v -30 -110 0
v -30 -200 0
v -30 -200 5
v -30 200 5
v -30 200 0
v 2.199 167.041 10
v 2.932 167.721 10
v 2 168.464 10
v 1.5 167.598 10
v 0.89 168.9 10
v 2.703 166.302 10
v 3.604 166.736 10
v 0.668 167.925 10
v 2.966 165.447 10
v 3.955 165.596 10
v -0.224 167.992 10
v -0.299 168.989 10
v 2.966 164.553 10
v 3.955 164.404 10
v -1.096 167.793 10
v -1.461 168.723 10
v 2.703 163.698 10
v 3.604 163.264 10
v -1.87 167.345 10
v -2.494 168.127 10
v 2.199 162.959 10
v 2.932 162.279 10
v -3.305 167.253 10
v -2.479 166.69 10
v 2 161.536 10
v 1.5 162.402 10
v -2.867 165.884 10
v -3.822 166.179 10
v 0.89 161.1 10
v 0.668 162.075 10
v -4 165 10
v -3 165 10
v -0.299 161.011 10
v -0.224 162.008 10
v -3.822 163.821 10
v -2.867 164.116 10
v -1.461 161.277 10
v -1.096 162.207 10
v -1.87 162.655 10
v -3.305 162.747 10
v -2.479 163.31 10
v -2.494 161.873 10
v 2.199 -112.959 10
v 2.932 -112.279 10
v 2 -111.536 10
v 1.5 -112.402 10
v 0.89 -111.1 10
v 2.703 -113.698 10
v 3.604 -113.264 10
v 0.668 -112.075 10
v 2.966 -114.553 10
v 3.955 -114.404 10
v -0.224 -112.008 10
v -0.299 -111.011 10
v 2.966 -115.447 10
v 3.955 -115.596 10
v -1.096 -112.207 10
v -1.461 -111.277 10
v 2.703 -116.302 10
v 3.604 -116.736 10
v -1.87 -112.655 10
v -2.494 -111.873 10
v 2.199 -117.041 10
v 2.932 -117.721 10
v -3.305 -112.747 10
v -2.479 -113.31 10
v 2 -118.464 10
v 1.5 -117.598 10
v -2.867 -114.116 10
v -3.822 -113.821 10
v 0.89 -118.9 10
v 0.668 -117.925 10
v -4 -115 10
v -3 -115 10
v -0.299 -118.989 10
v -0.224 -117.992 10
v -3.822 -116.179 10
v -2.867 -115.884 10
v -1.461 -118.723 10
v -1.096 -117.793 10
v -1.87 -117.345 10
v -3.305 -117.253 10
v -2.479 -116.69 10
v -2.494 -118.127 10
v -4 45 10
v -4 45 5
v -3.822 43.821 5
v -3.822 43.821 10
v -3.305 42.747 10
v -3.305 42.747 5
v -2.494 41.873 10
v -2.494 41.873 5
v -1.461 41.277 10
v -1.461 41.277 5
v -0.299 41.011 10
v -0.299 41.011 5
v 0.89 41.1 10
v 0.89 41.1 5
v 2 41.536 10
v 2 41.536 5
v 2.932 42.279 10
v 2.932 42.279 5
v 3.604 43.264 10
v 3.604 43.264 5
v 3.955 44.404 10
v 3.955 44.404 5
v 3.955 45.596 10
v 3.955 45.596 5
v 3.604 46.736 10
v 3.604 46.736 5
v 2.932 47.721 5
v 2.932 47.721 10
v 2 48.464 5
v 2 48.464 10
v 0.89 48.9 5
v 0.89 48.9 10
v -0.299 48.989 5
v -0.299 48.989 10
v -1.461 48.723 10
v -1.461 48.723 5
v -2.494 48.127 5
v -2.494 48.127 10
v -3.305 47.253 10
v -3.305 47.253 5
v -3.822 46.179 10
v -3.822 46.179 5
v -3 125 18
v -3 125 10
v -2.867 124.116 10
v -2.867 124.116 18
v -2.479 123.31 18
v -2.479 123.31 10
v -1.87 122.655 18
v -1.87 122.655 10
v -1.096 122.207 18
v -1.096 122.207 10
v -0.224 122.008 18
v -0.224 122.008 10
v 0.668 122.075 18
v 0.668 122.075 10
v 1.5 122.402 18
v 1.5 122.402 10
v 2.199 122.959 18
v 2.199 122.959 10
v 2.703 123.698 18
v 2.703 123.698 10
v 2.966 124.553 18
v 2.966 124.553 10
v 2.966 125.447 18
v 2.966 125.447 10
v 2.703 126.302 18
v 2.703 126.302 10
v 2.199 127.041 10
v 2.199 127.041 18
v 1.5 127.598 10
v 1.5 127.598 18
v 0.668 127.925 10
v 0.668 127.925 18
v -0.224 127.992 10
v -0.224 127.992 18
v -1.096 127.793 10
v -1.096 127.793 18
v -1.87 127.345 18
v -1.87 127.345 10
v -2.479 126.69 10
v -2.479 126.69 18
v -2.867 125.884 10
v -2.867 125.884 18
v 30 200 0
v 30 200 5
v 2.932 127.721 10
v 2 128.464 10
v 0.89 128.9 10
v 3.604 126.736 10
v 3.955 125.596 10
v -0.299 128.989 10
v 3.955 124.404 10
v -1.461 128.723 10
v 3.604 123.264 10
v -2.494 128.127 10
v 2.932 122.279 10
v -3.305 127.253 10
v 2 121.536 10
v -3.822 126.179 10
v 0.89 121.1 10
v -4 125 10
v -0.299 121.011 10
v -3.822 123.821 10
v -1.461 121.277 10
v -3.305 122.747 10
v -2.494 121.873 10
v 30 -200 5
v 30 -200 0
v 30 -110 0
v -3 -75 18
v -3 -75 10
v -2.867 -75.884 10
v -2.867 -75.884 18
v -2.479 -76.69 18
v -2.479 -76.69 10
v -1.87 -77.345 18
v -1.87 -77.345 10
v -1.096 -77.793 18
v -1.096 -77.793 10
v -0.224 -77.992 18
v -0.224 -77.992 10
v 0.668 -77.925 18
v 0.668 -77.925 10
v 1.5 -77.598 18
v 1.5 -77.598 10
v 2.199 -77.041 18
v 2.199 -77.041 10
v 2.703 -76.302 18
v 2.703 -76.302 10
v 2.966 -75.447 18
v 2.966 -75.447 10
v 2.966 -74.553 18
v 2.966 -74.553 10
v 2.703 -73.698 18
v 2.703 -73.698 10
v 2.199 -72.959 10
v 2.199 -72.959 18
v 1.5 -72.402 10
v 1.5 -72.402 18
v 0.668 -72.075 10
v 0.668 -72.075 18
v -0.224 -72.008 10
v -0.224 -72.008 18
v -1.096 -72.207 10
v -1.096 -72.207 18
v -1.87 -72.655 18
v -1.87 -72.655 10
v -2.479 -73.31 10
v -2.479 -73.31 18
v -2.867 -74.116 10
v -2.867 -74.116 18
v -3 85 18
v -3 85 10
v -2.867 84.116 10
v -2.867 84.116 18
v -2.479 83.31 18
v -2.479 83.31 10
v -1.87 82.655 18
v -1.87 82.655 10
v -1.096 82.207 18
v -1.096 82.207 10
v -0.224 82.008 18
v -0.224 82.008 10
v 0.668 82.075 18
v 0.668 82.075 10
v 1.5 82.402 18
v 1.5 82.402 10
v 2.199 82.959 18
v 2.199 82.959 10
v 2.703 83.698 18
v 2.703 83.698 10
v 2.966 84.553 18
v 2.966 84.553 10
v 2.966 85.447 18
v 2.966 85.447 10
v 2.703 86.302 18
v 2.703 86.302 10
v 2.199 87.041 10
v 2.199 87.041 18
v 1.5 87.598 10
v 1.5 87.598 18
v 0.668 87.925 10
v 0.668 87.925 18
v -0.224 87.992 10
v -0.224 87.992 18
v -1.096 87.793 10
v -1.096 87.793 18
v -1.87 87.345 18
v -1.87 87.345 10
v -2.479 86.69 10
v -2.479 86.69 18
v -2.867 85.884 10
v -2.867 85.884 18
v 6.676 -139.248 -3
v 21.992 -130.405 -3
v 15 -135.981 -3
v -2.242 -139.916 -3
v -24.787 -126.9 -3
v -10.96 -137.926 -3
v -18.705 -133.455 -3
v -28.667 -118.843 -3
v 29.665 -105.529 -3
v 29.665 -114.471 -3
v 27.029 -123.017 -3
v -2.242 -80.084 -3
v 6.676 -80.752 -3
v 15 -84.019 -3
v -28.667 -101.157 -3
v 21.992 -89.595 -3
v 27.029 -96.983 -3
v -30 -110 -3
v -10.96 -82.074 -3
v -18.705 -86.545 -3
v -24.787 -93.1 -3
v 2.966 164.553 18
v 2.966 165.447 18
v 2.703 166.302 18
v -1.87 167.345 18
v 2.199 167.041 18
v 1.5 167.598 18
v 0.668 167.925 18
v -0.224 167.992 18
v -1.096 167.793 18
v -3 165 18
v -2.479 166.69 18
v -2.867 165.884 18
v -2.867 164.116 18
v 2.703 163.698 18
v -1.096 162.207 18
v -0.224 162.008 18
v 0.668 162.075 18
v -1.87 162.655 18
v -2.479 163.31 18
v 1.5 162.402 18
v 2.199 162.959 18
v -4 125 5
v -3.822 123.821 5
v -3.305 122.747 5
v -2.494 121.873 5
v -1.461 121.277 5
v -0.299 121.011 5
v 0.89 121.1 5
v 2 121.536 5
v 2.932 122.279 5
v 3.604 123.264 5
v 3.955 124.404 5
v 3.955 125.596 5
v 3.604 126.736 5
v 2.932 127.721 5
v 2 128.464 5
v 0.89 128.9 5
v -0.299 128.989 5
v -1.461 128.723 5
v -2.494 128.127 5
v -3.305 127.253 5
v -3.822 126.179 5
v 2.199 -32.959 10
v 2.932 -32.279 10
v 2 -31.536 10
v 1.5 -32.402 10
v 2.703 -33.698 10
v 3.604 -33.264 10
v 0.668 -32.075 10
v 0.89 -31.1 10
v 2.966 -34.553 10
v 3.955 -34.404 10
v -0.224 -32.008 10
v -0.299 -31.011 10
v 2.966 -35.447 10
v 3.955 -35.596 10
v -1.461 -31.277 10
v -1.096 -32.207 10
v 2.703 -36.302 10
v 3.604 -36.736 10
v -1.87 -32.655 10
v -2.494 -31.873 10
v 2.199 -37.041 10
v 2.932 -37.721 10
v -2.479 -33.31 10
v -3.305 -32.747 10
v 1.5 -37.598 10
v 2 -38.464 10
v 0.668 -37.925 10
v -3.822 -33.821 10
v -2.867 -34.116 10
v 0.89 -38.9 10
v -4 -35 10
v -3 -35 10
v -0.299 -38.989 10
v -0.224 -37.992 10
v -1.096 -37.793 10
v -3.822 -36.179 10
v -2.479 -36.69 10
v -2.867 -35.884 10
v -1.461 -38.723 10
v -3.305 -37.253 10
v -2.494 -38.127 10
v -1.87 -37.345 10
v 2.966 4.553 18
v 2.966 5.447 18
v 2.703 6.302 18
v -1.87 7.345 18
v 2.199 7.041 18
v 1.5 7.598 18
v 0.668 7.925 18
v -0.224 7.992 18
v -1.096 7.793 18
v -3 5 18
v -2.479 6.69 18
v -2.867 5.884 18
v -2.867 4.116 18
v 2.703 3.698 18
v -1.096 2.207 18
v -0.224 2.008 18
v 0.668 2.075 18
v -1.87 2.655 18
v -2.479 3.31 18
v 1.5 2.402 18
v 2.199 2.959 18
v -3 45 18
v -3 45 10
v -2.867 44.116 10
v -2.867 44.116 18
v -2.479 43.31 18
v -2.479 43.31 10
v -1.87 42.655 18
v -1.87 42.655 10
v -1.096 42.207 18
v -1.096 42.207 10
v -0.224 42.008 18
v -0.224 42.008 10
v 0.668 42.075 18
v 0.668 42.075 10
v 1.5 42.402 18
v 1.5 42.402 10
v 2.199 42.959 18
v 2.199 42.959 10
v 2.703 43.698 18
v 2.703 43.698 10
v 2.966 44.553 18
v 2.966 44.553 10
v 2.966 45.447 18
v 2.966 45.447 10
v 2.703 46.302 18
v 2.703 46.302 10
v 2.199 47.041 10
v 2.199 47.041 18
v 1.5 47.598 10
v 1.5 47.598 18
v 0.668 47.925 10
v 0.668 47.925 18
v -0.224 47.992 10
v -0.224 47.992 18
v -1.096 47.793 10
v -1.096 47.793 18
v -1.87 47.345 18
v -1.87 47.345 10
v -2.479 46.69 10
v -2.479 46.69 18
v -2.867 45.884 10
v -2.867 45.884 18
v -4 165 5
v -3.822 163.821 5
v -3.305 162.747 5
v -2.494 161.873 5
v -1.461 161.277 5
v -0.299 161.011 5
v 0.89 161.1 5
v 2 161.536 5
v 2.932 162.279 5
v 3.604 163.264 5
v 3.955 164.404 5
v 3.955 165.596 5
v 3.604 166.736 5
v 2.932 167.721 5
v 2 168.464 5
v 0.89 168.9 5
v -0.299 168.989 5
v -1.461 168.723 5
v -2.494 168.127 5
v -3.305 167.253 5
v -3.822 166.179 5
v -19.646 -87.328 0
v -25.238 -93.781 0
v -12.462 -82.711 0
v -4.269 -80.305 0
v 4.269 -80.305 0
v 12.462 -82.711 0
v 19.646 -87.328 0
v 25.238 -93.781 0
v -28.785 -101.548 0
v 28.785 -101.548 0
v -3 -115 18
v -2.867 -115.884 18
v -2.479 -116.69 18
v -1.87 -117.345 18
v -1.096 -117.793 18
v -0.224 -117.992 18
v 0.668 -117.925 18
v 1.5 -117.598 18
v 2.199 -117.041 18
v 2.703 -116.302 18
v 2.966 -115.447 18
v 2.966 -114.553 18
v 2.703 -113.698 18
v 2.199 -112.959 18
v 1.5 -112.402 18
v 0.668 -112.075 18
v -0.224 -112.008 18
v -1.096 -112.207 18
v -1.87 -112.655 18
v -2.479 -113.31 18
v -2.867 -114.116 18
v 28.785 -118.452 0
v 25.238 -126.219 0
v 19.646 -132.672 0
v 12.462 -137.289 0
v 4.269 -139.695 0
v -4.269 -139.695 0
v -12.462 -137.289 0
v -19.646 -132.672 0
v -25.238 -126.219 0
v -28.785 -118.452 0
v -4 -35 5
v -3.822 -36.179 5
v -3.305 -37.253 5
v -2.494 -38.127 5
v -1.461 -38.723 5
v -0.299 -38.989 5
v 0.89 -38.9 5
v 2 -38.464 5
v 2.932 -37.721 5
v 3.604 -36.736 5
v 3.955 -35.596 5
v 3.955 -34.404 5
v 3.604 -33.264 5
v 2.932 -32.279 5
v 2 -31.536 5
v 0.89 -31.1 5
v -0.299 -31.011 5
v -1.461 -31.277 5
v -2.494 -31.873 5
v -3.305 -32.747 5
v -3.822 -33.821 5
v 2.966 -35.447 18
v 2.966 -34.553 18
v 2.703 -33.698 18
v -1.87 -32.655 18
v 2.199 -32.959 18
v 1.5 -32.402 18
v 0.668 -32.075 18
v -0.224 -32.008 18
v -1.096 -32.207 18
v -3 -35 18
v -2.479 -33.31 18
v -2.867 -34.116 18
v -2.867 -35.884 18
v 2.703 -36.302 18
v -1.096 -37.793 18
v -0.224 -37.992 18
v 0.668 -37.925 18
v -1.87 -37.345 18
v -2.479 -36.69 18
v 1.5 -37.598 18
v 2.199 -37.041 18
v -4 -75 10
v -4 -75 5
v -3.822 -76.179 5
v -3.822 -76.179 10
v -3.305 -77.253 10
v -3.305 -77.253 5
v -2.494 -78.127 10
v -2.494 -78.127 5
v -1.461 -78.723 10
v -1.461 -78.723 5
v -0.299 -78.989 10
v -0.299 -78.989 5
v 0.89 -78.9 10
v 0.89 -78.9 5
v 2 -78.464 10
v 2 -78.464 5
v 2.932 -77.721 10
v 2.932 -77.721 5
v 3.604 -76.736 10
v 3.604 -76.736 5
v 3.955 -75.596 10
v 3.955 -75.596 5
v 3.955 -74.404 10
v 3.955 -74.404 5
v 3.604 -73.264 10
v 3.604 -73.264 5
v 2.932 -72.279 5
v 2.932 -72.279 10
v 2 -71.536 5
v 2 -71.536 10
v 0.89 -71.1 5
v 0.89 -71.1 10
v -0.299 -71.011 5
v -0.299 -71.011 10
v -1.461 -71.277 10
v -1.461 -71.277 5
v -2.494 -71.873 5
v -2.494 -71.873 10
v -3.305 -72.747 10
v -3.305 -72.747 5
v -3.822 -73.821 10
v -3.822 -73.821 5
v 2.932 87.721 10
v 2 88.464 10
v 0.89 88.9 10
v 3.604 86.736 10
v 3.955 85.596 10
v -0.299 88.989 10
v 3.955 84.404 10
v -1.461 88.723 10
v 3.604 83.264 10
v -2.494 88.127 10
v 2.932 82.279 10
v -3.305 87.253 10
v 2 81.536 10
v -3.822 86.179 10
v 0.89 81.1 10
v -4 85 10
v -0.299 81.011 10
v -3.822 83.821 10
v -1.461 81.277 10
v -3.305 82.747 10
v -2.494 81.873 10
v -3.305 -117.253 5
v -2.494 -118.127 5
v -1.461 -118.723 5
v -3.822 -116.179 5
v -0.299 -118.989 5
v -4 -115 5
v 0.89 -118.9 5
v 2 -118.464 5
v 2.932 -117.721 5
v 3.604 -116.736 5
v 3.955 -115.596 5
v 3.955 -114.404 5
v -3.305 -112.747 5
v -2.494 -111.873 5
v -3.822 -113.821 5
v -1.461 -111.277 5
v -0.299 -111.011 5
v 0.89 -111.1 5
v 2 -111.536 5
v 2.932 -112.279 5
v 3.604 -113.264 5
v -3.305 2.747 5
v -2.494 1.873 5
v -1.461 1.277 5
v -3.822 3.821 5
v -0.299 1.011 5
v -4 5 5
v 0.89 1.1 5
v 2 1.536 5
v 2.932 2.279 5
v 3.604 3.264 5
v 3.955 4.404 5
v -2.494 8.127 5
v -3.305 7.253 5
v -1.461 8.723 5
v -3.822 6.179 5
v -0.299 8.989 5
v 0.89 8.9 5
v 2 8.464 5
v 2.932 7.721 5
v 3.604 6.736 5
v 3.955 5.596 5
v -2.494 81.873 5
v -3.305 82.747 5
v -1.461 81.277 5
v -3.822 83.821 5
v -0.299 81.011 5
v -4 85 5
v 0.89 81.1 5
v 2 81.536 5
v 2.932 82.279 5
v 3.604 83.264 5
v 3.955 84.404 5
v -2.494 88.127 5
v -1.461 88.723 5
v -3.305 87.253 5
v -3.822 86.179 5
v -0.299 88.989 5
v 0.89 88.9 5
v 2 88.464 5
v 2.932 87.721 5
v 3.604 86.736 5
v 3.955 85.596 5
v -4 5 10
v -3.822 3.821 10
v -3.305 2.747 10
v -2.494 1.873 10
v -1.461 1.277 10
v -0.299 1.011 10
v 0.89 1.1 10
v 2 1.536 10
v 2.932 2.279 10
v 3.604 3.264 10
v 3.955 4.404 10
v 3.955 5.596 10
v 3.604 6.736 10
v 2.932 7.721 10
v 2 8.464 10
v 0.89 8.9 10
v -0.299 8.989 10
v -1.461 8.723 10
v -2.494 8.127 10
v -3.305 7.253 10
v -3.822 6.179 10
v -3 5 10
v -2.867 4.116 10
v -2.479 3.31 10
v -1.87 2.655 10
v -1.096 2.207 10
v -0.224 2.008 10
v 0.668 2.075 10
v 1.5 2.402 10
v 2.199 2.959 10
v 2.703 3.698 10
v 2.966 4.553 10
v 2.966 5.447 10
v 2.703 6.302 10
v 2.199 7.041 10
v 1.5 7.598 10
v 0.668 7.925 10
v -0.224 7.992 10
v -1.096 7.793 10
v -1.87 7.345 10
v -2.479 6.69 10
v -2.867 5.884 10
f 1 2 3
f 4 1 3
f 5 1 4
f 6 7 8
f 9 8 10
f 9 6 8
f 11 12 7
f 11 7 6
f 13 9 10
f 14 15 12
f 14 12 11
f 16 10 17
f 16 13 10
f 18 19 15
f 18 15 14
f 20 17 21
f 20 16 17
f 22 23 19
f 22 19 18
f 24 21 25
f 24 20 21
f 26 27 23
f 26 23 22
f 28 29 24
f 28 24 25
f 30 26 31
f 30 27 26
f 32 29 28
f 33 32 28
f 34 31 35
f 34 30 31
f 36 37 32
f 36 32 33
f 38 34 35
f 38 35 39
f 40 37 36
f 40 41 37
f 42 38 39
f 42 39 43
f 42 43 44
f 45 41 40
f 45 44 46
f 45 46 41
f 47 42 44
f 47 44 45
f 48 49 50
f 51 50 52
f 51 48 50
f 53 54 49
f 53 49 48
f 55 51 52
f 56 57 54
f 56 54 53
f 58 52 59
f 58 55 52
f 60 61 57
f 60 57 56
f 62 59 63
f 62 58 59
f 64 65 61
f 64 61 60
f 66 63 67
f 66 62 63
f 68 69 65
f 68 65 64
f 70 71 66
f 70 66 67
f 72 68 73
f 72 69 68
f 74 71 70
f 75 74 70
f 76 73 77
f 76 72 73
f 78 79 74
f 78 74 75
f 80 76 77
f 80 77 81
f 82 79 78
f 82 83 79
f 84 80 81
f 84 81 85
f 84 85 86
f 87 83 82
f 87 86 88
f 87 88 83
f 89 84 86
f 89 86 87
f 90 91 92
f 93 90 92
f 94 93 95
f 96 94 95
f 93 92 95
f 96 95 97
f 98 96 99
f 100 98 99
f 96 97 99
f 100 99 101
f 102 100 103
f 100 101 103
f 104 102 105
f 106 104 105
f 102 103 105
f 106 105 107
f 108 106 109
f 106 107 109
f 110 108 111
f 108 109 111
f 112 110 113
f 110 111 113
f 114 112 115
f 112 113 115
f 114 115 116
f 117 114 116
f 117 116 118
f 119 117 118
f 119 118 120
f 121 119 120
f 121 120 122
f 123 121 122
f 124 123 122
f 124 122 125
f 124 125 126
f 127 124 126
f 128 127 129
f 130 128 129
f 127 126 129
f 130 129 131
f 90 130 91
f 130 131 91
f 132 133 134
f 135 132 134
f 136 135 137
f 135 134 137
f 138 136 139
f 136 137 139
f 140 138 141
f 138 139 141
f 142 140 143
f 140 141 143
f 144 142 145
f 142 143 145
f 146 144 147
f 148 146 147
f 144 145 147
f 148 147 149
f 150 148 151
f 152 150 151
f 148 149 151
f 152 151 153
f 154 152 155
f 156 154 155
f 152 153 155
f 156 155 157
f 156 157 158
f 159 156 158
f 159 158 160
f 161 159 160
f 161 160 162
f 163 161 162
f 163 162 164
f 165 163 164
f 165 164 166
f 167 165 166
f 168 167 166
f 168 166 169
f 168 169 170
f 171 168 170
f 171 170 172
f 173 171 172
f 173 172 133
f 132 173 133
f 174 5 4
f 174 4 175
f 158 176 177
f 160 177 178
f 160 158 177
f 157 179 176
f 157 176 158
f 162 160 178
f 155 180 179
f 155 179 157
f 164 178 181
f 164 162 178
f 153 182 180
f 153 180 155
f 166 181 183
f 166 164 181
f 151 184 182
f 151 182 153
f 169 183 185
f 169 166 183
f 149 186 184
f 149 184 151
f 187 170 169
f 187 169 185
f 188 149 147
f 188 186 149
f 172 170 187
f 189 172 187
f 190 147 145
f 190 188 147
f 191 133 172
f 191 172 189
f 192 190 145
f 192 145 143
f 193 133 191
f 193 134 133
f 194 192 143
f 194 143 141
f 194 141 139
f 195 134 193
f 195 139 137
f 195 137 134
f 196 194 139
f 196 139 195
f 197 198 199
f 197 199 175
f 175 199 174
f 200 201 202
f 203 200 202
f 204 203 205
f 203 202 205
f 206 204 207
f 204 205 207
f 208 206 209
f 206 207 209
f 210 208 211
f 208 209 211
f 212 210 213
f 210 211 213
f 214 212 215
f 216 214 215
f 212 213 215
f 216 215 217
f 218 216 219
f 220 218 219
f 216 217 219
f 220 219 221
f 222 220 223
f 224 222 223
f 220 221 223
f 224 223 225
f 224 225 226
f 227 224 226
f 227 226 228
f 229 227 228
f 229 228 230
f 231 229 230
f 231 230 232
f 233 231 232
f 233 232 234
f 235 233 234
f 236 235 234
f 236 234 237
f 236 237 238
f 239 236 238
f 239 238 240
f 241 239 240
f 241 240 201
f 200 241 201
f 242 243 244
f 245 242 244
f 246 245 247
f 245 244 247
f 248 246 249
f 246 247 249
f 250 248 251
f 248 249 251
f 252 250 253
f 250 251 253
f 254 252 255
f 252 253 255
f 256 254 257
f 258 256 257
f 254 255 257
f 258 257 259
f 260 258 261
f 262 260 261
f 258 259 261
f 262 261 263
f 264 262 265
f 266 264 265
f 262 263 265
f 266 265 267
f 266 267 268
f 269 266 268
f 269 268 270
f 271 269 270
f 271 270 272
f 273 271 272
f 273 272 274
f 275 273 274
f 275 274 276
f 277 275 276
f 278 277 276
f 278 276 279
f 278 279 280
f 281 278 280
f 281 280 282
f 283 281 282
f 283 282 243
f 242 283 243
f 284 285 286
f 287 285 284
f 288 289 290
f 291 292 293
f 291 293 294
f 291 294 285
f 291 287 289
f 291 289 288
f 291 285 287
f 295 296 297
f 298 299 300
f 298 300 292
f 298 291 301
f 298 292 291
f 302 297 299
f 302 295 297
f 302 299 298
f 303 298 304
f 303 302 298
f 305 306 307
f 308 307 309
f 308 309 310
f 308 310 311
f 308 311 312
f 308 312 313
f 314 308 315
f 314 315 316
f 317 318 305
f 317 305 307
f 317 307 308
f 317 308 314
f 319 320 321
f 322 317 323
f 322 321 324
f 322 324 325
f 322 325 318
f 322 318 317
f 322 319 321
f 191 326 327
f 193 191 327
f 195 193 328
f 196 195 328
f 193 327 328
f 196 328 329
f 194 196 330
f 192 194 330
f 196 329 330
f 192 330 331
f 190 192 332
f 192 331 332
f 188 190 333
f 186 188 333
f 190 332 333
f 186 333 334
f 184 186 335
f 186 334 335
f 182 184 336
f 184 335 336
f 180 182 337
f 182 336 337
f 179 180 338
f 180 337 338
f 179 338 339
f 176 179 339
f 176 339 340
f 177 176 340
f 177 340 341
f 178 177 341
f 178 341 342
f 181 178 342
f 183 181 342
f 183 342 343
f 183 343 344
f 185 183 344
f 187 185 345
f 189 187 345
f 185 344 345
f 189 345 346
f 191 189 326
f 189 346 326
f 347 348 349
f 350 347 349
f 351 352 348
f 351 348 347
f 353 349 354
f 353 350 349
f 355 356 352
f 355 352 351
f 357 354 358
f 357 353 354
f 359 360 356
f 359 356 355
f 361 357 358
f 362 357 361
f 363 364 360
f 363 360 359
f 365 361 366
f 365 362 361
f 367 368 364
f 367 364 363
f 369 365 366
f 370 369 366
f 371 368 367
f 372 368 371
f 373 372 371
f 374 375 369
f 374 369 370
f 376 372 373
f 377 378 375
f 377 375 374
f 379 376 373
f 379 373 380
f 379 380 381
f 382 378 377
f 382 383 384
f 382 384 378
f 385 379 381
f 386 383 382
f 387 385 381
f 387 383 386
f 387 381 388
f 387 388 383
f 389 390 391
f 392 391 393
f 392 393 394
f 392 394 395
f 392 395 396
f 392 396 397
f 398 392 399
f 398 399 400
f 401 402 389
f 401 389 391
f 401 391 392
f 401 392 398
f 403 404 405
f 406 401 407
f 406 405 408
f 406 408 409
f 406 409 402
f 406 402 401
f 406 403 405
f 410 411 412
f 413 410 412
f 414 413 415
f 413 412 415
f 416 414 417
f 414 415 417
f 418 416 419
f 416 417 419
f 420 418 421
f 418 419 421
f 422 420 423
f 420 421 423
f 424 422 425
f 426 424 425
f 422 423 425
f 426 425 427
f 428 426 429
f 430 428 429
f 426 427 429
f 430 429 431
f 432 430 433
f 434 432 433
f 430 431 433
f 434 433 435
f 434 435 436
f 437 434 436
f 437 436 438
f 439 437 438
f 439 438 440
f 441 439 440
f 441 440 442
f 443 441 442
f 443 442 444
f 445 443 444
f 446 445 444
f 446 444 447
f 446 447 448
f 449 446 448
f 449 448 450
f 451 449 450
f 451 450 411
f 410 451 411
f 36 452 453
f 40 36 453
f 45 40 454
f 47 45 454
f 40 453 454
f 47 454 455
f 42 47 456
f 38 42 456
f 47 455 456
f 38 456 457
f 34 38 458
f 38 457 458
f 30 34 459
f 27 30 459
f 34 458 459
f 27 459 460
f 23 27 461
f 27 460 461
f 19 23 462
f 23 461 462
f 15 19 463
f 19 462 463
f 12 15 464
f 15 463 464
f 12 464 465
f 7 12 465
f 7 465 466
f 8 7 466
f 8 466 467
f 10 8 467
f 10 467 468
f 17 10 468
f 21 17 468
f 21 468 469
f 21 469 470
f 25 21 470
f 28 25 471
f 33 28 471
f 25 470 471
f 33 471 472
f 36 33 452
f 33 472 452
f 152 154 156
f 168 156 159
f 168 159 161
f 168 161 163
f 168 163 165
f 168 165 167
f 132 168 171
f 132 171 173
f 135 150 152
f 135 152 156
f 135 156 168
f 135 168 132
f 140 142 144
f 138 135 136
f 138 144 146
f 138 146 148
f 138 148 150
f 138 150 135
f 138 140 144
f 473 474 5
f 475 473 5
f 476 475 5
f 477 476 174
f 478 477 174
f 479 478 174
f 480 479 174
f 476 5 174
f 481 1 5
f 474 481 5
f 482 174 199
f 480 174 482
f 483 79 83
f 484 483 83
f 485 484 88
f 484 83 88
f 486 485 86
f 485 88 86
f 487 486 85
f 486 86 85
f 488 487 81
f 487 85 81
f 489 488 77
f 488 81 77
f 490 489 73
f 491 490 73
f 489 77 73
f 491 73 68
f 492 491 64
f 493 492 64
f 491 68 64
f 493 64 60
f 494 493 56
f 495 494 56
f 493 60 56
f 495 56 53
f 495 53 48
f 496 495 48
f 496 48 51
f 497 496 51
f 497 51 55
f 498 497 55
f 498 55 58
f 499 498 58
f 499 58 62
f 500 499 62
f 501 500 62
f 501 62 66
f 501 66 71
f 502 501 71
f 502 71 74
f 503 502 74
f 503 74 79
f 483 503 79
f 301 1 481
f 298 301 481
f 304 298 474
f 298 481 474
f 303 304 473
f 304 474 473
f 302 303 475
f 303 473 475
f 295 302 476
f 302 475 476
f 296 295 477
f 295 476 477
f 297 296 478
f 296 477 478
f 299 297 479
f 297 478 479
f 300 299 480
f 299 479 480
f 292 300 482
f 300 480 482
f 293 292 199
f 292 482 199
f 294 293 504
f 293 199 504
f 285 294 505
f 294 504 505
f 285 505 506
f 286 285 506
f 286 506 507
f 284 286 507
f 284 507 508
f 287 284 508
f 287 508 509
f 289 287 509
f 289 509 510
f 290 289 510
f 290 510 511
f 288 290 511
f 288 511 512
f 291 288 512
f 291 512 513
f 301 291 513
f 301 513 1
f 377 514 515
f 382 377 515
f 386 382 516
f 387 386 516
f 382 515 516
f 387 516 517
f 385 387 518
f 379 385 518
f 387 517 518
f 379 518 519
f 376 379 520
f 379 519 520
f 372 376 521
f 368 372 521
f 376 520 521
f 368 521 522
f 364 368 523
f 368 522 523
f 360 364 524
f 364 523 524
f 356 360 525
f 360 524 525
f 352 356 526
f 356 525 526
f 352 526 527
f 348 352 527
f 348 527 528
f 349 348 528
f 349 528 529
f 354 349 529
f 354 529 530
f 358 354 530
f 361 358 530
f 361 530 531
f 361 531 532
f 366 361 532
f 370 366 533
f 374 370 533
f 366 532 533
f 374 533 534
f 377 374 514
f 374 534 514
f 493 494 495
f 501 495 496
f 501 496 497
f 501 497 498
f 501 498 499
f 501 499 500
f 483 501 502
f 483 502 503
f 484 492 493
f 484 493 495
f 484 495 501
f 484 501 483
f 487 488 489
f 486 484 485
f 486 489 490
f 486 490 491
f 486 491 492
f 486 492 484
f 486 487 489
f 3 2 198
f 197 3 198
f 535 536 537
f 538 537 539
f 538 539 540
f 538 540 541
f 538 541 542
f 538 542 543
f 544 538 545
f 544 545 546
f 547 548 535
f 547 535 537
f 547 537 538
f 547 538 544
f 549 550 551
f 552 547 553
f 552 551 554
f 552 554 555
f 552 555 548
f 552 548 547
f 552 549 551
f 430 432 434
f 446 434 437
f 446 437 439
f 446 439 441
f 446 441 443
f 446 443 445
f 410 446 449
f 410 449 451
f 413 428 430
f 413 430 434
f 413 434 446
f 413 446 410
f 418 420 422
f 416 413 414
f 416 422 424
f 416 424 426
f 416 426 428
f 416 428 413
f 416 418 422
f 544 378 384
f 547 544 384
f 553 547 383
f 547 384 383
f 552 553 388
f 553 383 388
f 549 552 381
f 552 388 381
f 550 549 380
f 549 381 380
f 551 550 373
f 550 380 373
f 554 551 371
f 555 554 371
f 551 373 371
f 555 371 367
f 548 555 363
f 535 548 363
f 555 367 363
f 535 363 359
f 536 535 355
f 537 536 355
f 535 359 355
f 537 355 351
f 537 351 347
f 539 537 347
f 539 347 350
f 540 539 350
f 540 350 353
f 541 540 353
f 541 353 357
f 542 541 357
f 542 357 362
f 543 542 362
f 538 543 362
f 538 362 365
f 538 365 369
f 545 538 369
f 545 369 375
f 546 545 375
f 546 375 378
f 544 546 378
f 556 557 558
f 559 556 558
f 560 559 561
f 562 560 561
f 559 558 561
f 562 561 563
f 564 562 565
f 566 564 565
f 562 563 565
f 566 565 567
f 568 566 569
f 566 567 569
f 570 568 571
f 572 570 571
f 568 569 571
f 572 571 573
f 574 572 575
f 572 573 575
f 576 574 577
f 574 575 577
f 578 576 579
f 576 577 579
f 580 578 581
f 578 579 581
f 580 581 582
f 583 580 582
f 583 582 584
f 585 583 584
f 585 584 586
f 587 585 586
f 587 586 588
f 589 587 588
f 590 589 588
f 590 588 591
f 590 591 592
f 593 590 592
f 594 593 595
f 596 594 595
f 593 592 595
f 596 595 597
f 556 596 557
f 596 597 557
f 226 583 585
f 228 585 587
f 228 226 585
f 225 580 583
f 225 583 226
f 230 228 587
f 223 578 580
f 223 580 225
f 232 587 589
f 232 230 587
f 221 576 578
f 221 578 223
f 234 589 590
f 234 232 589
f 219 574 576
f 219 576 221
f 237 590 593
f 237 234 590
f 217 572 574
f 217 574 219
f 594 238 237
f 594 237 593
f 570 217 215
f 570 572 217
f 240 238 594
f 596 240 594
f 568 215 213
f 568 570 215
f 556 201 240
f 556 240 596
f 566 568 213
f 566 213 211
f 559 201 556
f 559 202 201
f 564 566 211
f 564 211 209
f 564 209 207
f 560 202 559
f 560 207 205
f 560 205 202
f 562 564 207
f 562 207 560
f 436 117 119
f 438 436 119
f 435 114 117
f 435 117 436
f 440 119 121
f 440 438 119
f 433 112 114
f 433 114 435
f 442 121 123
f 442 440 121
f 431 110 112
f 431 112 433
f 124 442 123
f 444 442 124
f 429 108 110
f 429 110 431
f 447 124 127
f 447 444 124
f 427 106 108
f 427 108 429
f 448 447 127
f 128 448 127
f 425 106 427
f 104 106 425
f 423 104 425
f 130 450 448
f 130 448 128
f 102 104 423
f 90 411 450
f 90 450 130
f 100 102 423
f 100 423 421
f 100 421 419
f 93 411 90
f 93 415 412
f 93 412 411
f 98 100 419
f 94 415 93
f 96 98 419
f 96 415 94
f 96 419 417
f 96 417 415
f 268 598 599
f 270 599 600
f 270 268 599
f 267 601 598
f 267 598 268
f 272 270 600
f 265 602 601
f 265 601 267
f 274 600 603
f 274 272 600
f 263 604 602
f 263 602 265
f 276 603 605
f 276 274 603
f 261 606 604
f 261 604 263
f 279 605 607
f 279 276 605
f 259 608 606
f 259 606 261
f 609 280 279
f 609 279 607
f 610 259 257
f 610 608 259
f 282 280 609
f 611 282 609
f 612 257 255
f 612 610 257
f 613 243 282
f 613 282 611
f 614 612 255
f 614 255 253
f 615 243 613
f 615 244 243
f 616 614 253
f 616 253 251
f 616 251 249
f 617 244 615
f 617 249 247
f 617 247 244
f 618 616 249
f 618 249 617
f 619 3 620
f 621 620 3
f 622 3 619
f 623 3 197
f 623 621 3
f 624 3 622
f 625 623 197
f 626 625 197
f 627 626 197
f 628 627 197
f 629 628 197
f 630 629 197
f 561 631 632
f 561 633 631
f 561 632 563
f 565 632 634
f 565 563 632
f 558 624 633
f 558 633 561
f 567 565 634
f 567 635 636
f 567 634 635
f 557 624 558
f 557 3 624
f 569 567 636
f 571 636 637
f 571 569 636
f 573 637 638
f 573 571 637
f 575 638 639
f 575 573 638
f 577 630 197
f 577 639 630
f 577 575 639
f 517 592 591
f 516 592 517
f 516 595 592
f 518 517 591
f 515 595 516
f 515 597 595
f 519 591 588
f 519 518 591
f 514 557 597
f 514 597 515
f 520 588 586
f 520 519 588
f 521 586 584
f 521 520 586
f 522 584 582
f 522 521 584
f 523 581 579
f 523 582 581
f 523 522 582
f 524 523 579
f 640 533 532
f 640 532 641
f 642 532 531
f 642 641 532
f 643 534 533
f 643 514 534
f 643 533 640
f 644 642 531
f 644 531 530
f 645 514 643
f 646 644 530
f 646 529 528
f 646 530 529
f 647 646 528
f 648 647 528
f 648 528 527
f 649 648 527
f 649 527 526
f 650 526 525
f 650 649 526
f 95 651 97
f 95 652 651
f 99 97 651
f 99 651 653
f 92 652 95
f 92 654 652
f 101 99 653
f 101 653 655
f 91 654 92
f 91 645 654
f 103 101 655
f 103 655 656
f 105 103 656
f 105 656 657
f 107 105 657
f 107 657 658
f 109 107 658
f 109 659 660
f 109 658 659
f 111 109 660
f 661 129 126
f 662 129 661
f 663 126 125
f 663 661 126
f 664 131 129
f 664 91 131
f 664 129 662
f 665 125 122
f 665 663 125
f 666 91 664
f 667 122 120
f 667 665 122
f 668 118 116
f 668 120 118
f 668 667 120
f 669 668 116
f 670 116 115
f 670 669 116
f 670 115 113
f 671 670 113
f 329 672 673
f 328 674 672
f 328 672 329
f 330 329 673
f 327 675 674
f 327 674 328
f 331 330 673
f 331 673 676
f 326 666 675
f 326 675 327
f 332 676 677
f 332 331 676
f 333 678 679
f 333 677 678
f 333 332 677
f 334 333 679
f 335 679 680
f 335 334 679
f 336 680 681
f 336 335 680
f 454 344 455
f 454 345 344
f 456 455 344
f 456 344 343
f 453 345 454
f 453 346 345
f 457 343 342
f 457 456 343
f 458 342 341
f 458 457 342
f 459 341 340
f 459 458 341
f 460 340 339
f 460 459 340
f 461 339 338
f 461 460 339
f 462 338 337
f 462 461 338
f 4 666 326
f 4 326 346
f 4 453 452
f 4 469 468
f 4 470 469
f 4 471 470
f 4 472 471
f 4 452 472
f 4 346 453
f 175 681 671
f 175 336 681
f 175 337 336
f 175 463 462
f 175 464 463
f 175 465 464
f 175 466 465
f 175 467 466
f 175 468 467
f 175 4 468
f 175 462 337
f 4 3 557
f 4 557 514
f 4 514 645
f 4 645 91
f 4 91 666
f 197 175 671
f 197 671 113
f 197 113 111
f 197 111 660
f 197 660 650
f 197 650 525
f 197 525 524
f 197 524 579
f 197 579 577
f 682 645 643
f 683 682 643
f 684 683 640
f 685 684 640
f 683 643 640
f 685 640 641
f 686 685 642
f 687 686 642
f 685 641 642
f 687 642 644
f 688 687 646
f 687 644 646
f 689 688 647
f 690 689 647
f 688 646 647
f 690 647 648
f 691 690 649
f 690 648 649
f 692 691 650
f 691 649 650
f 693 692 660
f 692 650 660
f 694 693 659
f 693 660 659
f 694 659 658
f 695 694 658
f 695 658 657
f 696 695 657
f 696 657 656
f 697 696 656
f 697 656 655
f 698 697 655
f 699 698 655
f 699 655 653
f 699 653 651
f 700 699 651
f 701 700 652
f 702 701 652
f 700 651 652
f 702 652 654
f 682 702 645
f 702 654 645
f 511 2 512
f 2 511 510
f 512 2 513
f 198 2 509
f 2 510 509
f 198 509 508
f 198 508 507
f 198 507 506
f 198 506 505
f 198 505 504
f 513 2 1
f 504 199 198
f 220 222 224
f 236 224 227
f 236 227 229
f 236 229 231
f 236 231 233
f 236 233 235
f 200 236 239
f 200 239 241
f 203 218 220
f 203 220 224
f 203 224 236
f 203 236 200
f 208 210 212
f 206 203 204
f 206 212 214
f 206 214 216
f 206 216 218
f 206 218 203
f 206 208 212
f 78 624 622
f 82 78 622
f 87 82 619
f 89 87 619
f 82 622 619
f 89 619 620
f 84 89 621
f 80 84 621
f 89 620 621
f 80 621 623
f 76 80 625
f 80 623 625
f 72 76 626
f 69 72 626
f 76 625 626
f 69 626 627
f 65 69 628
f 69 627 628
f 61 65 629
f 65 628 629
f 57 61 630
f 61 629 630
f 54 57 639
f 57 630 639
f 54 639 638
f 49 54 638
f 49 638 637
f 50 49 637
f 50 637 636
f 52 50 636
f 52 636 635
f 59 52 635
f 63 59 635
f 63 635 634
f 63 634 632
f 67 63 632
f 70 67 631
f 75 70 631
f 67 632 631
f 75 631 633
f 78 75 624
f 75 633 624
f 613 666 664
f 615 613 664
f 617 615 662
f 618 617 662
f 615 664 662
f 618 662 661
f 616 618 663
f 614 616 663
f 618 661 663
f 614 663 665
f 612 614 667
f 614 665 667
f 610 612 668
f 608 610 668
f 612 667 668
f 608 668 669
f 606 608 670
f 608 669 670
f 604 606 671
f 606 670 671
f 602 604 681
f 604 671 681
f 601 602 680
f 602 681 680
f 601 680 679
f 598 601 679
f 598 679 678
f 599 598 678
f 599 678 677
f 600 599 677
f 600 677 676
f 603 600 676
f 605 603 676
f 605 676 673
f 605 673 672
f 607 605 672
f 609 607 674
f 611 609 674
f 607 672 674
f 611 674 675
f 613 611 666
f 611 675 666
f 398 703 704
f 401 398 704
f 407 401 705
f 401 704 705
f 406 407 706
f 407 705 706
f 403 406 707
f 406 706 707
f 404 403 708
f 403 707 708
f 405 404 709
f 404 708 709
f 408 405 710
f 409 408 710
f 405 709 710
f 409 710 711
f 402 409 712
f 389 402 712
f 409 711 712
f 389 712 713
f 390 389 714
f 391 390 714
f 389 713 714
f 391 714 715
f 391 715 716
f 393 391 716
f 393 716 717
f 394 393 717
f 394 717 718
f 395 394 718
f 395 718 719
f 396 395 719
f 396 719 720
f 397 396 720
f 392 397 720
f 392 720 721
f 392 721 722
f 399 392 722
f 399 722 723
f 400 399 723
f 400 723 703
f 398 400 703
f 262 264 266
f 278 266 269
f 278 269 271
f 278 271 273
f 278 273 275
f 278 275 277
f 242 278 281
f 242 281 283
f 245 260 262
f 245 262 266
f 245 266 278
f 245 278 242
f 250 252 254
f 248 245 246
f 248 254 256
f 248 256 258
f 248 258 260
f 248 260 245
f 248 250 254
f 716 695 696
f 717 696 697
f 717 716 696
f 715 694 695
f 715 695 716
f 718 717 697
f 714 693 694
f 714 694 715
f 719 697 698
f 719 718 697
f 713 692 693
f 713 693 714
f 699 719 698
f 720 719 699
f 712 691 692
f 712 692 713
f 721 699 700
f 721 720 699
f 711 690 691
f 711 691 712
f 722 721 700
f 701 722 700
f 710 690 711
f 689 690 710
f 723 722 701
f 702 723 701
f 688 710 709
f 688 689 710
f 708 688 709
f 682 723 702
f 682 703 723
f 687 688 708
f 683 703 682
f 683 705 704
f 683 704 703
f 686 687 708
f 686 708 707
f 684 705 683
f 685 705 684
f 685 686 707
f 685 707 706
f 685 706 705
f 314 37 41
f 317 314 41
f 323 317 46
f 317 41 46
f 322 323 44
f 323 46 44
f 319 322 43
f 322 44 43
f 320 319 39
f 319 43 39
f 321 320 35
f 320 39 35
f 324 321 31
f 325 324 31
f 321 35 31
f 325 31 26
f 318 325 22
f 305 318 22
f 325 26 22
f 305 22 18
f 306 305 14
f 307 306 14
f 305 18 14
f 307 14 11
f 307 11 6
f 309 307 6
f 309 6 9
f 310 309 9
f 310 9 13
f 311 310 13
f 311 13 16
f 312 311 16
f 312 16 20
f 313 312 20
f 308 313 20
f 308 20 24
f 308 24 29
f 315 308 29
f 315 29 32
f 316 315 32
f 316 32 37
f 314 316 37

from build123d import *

# Parameters (mm, degrees)
SKETCH1_W           = 60
SKETCH1_H           = 400
BOSS_EXTRUDE1_DEPTH = 5
SKETCH2_R           = 30
BOSS_EXTRUDE2_DEPTH = 3
SKETCH3_R           = 3
BOSS_EXTRUDE3_DEPTH = 13
SKETCH4_R           = 4
BOSS_EXTRUDE4_DEPTH = 5
LPATTERN1_COUNT     = 8
LPATTERN1_PITCH     = 40


with BuildPart() as part:
    # Sketch1 → Boss-Extrude1 (new body)
    with BuildSketch(Plane.XY):
        Rectangle(SKETCH1_W, SKETCH1_H)
    extrude(amount=BOSS_EXTRUDE1_DEPTH)

    # Sketch2 → Boss-Extrude2 (add)
    with BuildSketch(Plane(origin=(0, 0, 0), x_dir=(-1, 0, 0), z_dir=(0, 0, -1))):
        with Locations((0, -110)):
            Circle(SKETCH2_R)
    extrude(amount=BOSS_EXTRUDE2_DEPTH)

    # Sketch3 → Boss-Extrude3 (add)
    with BuildSketch(Plane.XY.offset(5)):
        with Locations(Location((0, 165, 0), (0, 0, 180))):
            Circle(SKETCH3_R)
    boss_extrude3 = extrude(amount=BOSS_EXTRUDE3_DEPTH)

    # Sketch4 → Boss-Extrude4 (add)
    with BuildSketch(Plane.XY.offset(5)):
        with Locations(Location((0, 165, 0), (0, 0, 180))):
            Circle(SKETCH4_R)
    boss_extrude4 = extrude(amount=BOSS_EXTRUDE4_DEPTH)

    # LPattern1: Boss-Extrude3, Boss-Extrude4 ×8
    with Locations(*[(0, -i * LPATTERN1_PITCH, 0) for i in range(1, LPATTERN1_COUNT)]):
        add(boss_extrude3)
        add(boss_extrude4)


solid = part.part
